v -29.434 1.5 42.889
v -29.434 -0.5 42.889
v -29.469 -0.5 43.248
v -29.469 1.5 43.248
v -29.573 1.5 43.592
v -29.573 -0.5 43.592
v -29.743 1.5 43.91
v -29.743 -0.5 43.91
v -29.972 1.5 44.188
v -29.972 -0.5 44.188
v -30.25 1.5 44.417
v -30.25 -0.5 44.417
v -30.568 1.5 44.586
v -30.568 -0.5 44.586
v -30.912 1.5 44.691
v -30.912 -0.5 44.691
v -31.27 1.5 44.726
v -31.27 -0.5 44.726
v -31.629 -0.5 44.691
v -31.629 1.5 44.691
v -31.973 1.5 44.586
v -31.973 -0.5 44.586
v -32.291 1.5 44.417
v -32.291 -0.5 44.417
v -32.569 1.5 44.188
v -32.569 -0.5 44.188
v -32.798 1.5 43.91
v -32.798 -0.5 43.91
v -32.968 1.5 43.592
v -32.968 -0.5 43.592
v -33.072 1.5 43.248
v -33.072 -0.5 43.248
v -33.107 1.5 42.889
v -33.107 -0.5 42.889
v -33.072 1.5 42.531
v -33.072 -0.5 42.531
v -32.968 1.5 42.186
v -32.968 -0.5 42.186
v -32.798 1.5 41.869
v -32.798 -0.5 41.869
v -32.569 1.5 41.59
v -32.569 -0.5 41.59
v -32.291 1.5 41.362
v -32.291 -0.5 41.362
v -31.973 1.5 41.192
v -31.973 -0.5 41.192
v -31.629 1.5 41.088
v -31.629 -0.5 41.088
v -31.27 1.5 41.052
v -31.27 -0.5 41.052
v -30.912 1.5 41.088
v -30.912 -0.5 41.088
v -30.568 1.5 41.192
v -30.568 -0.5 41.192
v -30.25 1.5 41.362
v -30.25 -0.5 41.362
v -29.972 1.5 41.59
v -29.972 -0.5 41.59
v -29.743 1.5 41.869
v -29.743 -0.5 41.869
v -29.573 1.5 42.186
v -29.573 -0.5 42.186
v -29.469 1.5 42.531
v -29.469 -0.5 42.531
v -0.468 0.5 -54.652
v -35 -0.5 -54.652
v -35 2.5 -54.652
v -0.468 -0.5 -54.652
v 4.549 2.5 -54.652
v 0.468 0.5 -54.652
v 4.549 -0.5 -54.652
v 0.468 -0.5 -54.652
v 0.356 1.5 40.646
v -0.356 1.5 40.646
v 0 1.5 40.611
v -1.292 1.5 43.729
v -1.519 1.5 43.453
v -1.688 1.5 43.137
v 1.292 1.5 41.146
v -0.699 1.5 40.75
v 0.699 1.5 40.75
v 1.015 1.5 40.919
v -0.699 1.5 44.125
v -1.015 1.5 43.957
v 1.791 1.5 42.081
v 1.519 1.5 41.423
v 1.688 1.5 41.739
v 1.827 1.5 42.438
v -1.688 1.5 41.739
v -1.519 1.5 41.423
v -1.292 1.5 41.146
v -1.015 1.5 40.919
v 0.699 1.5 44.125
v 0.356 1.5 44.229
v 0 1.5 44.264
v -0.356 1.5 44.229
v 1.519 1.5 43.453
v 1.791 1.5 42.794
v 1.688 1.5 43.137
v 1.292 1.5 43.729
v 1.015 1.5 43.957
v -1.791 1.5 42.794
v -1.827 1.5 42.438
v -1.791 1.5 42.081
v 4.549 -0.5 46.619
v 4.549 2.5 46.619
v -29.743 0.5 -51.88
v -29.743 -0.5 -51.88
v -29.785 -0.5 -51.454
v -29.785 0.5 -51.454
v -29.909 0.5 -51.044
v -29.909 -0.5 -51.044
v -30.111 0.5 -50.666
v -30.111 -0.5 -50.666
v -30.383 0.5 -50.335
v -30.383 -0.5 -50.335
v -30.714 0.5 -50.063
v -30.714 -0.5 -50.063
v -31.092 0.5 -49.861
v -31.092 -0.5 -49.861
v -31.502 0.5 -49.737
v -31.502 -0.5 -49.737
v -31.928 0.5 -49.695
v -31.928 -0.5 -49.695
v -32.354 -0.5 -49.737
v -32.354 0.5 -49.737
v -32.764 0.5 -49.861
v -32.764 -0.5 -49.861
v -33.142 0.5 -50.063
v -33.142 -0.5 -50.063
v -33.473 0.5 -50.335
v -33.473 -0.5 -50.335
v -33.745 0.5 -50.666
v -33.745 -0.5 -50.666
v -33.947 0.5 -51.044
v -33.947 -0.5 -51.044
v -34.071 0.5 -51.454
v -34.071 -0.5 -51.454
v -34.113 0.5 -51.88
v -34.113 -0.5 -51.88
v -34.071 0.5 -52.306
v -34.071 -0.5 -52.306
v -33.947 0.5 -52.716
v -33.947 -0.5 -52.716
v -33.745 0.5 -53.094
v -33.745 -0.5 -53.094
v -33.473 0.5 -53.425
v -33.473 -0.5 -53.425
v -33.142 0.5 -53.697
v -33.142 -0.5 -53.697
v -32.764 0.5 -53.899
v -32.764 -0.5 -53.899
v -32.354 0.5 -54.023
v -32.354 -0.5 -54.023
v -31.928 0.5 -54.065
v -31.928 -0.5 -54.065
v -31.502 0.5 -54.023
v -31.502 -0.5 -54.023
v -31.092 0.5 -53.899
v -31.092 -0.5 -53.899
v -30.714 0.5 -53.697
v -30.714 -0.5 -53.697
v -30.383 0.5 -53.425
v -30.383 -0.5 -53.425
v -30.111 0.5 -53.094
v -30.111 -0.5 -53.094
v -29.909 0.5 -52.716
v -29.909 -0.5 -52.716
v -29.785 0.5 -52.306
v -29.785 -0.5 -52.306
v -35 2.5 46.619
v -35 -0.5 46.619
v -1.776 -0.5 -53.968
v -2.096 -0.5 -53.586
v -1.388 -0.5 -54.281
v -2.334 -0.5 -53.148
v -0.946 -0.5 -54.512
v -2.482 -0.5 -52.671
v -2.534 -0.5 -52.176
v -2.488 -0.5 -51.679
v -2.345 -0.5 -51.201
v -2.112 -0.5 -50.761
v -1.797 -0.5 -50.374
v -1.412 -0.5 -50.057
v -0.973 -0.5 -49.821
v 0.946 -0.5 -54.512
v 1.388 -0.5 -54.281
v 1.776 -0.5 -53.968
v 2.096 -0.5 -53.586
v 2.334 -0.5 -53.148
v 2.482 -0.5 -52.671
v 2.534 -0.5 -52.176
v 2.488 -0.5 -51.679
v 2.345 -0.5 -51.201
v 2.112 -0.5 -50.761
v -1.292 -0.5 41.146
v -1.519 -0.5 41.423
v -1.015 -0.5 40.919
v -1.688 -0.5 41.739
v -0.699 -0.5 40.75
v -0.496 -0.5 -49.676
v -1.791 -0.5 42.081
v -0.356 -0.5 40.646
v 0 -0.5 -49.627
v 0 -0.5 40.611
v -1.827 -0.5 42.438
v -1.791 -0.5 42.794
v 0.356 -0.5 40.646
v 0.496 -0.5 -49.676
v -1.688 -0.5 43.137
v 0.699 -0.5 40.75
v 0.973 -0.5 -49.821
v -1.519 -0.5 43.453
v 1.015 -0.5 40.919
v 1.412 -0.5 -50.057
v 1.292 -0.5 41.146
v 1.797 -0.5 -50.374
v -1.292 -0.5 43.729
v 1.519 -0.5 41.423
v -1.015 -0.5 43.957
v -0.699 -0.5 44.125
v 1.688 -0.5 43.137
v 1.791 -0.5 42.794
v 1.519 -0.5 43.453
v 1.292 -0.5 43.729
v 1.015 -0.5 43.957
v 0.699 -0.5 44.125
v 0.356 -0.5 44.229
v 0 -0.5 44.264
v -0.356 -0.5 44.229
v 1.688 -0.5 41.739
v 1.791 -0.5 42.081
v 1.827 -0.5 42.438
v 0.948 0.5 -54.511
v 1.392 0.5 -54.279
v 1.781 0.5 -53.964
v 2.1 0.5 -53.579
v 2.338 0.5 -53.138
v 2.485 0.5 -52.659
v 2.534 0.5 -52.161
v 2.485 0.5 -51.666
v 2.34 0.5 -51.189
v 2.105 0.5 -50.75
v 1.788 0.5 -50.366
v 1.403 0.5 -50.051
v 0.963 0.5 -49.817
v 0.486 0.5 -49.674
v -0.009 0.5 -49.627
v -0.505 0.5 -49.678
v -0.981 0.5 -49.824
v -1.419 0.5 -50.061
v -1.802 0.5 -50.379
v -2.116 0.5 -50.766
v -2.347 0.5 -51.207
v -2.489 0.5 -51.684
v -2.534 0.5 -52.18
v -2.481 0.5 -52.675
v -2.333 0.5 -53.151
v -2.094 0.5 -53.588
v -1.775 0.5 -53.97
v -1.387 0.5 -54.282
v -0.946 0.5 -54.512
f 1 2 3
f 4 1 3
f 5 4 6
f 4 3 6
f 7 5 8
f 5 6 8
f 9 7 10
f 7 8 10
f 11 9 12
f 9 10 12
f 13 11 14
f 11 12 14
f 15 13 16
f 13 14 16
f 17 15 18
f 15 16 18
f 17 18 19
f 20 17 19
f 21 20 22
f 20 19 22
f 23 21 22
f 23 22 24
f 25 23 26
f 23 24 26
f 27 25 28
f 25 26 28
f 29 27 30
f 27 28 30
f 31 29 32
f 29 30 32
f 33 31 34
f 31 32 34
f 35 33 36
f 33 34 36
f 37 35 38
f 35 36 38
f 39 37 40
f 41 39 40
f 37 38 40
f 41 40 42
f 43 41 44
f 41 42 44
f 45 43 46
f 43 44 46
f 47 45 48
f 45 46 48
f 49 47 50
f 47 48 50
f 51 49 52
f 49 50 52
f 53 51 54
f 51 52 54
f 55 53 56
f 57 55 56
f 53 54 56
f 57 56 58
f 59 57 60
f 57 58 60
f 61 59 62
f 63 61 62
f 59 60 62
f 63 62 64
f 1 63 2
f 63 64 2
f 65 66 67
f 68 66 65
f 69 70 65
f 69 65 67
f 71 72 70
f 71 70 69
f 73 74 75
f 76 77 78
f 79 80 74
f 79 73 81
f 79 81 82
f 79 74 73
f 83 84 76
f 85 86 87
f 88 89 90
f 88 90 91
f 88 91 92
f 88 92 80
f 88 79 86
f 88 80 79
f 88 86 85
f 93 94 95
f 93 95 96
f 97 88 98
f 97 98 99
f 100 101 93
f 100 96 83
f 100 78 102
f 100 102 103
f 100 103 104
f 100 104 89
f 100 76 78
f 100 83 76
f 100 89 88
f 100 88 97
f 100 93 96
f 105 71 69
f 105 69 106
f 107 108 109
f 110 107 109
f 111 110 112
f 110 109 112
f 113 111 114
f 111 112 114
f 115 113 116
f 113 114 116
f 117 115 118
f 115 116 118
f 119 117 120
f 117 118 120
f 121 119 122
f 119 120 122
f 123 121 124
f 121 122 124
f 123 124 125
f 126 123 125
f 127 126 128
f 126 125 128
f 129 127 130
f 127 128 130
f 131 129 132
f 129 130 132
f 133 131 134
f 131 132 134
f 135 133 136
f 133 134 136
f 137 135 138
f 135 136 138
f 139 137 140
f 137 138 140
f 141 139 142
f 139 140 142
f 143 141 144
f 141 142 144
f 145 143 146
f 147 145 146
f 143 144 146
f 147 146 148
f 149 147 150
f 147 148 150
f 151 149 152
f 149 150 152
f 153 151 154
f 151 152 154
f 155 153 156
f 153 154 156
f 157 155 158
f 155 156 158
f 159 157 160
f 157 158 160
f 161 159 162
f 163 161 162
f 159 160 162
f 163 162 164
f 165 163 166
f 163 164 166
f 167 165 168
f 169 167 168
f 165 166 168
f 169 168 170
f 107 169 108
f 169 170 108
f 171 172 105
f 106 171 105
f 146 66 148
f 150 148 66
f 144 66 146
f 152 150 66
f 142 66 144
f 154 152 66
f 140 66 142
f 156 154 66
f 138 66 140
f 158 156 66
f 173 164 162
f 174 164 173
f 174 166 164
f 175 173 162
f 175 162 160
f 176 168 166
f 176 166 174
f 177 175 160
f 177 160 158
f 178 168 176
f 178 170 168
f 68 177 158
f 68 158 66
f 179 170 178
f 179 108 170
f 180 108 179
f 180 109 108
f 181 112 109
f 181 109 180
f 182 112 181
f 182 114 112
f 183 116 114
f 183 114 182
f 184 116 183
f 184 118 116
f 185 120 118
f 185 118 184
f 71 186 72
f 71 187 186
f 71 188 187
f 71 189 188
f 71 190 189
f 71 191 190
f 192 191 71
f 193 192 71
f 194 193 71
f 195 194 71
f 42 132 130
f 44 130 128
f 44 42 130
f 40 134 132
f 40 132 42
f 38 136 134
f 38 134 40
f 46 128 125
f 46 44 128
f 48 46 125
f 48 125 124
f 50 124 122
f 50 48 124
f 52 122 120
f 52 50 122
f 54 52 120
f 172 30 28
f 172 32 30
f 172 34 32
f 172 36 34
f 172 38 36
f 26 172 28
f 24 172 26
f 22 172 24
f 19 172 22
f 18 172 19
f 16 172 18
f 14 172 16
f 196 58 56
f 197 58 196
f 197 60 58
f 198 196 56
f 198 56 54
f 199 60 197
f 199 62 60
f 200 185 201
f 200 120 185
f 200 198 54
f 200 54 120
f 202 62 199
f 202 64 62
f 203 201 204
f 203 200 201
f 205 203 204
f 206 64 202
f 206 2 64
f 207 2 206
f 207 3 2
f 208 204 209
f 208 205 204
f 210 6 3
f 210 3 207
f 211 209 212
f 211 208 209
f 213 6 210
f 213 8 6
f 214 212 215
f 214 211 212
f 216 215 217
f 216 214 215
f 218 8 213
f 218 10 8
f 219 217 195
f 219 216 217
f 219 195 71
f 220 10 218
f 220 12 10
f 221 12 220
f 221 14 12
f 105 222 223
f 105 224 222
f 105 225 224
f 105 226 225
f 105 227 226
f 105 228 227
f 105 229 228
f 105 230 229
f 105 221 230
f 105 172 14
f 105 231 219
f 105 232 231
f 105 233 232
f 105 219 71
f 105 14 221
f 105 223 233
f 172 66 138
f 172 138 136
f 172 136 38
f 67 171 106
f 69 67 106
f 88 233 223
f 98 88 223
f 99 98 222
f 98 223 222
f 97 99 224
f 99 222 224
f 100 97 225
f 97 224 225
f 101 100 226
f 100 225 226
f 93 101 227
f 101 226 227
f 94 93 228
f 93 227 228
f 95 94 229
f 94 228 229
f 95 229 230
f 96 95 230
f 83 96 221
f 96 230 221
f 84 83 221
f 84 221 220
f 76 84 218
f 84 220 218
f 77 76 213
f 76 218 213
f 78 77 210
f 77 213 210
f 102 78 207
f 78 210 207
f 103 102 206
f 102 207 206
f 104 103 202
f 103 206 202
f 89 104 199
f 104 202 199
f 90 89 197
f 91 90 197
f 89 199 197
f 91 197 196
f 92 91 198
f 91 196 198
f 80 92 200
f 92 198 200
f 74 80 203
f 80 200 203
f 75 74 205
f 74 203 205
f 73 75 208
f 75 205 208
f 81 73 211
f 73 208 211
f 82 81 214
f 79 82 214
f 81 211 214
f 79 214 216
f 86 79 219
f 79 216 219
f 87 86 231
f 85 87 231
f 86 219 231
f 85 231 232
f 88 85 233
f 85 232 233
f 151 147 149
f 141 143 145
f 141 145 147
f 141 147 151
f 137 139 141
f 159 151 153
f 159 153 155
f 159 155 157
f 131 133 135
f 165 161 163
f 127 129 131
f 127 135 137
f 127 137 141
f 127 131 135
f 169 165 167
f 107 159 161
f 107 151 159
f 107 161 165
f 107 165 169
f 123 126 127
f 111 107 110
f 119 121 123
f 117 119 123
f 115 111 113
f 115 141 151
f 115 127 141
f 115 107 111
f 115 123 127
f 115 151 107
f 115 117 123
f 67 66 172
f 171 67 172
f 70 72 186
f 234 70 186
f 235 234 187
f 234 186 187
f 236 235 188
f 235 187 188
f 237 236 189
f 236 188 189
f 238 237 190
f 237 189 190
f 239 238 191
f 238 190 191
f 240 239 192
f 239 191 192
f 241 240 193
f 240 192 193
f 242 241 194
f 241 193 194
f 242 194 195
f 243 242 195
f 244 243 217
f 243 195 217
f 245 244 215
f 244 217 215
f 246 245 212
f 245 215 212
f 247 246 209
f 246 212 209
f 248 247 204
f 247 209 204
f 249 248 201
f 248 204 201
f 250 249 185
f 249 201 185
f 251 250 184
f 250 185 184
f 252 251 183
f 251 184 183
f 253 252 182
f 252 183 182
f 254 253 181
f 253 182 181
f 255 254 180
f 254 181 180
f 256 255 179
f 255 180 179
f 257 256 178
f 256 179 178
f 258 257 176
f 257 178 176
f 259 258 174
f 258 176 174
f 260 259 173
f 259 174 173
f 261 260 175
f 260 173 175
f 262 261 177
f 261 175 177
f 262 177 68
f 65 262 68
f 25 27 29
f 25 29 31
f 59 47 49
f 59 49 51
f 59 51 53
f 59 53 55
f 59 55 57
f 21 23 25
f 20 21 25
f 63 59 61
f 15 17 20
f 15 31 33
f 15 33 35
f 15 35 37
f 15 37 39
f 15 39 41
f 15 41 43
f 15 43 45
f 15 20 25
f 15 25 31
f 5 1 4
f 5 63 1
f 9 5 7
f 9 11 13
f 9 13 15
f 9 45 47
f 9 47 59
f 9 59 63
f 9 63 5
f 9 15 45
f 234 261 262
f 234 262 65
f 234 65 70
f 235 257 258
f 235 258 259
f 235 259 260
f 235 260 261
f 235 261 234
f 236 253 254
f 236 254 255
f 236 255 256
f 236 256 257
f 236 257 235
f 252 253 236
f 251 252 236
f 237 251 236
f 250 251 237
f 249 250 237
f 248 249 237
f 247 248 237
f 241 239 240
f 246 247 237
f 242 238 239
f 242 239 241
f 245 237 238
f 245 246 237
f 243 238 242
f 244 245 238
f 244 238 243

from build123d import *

# Parameters (mm, degrees)
F0_W     = 64.5491797477
F0_H     = 101.2704968452
F1_DEPTH = 2.5
F2_DEPTH = 2
F3_R     = 1.8369615549
F3_R_2   = 2.1624343972
F4_DEPTH = 2
F5_DEPTH = 25
F6_R     = 1.8265653587
F7_DEPTH = 2
F8_R     = 2.1849451914
F9_DEPTH = 1


with BuildPart() as f1:
    # F0 (on Front) → F1 (new body, symmetric)
    with BuildSketch(Plane.XZ):
        with Locations((-2.7254102752, -4.0163956583)):
            Rectangle(F0_W, F0_H)
    extrude(amount=F1_DEPTH, both=True)

    # F2 (cut): a face of the model
    f2_faces = [f1.faces().sort_by_distance(p)[0] for p in [
        (-2.7254102752, -2.5, -4.0163956583),
    ]]
    extrude(f2_faces, amount=-F2_DEPTH, mode=Mode.SUBTRACT)

    # F3 (on face) → F4 (cut)
    with BuildSketch(Plane.XZ.offset(0.5)):
        with Locations((-31.2704928219, 42.8893454373)):
            Circle(F3_R)
        with Locations((24.9330345541, 42.5505004823)):
            Circle(F3_R_2)
    extrude(amount=-F4_DEPTH, mode=Mode.SUBTRACT)

    # F5 (cut): a face of the model
    f5_faces = [f1.faces().sort_by_distance(p)[0] for p in [
        (29.5491795987, 1, -4.0163956583),
    ]]
    extrude(f5_faces, amount=-F5_DEPTH, mode=Mode.SUBTRACT)

    # F6 (on face) → F7 (cut)
    with BuildSketch(Plane.XZ.offset(0.5)):
        with Locations((0, 42.4377880991)):
            Circle(F6_R)
    extrude(amount=-F7_DEPTH, mode=Mode.SUBTRACT)

    # F8 (on face) → F9 (cut, symmetric)
    with BuildSketch(Plane.XZ.offset(0.5)):
        with Locations((-31.927973032, -51.87997967)):
            Circle(F8_R)
        with BuildLine():
            ThreePointArc((0.4676342261, -54.6516440809), (1.9501898117, -53.7791984525), (2.5340613246, -52.1611049771))
            ThreePointArc((2.5340613246, -52.1611049771), (-1.6180934754, -50.2109151655), (-0.4676342261, -54.6516440809))
            Line((-0.4676342261, -54.6516440809), (0.4676342261, -54.6516440809))
        make_face()
    extrude(amount=F9_DEPTH, both=True, mode=Mode.SUBTRACT)


solid = f1.part
